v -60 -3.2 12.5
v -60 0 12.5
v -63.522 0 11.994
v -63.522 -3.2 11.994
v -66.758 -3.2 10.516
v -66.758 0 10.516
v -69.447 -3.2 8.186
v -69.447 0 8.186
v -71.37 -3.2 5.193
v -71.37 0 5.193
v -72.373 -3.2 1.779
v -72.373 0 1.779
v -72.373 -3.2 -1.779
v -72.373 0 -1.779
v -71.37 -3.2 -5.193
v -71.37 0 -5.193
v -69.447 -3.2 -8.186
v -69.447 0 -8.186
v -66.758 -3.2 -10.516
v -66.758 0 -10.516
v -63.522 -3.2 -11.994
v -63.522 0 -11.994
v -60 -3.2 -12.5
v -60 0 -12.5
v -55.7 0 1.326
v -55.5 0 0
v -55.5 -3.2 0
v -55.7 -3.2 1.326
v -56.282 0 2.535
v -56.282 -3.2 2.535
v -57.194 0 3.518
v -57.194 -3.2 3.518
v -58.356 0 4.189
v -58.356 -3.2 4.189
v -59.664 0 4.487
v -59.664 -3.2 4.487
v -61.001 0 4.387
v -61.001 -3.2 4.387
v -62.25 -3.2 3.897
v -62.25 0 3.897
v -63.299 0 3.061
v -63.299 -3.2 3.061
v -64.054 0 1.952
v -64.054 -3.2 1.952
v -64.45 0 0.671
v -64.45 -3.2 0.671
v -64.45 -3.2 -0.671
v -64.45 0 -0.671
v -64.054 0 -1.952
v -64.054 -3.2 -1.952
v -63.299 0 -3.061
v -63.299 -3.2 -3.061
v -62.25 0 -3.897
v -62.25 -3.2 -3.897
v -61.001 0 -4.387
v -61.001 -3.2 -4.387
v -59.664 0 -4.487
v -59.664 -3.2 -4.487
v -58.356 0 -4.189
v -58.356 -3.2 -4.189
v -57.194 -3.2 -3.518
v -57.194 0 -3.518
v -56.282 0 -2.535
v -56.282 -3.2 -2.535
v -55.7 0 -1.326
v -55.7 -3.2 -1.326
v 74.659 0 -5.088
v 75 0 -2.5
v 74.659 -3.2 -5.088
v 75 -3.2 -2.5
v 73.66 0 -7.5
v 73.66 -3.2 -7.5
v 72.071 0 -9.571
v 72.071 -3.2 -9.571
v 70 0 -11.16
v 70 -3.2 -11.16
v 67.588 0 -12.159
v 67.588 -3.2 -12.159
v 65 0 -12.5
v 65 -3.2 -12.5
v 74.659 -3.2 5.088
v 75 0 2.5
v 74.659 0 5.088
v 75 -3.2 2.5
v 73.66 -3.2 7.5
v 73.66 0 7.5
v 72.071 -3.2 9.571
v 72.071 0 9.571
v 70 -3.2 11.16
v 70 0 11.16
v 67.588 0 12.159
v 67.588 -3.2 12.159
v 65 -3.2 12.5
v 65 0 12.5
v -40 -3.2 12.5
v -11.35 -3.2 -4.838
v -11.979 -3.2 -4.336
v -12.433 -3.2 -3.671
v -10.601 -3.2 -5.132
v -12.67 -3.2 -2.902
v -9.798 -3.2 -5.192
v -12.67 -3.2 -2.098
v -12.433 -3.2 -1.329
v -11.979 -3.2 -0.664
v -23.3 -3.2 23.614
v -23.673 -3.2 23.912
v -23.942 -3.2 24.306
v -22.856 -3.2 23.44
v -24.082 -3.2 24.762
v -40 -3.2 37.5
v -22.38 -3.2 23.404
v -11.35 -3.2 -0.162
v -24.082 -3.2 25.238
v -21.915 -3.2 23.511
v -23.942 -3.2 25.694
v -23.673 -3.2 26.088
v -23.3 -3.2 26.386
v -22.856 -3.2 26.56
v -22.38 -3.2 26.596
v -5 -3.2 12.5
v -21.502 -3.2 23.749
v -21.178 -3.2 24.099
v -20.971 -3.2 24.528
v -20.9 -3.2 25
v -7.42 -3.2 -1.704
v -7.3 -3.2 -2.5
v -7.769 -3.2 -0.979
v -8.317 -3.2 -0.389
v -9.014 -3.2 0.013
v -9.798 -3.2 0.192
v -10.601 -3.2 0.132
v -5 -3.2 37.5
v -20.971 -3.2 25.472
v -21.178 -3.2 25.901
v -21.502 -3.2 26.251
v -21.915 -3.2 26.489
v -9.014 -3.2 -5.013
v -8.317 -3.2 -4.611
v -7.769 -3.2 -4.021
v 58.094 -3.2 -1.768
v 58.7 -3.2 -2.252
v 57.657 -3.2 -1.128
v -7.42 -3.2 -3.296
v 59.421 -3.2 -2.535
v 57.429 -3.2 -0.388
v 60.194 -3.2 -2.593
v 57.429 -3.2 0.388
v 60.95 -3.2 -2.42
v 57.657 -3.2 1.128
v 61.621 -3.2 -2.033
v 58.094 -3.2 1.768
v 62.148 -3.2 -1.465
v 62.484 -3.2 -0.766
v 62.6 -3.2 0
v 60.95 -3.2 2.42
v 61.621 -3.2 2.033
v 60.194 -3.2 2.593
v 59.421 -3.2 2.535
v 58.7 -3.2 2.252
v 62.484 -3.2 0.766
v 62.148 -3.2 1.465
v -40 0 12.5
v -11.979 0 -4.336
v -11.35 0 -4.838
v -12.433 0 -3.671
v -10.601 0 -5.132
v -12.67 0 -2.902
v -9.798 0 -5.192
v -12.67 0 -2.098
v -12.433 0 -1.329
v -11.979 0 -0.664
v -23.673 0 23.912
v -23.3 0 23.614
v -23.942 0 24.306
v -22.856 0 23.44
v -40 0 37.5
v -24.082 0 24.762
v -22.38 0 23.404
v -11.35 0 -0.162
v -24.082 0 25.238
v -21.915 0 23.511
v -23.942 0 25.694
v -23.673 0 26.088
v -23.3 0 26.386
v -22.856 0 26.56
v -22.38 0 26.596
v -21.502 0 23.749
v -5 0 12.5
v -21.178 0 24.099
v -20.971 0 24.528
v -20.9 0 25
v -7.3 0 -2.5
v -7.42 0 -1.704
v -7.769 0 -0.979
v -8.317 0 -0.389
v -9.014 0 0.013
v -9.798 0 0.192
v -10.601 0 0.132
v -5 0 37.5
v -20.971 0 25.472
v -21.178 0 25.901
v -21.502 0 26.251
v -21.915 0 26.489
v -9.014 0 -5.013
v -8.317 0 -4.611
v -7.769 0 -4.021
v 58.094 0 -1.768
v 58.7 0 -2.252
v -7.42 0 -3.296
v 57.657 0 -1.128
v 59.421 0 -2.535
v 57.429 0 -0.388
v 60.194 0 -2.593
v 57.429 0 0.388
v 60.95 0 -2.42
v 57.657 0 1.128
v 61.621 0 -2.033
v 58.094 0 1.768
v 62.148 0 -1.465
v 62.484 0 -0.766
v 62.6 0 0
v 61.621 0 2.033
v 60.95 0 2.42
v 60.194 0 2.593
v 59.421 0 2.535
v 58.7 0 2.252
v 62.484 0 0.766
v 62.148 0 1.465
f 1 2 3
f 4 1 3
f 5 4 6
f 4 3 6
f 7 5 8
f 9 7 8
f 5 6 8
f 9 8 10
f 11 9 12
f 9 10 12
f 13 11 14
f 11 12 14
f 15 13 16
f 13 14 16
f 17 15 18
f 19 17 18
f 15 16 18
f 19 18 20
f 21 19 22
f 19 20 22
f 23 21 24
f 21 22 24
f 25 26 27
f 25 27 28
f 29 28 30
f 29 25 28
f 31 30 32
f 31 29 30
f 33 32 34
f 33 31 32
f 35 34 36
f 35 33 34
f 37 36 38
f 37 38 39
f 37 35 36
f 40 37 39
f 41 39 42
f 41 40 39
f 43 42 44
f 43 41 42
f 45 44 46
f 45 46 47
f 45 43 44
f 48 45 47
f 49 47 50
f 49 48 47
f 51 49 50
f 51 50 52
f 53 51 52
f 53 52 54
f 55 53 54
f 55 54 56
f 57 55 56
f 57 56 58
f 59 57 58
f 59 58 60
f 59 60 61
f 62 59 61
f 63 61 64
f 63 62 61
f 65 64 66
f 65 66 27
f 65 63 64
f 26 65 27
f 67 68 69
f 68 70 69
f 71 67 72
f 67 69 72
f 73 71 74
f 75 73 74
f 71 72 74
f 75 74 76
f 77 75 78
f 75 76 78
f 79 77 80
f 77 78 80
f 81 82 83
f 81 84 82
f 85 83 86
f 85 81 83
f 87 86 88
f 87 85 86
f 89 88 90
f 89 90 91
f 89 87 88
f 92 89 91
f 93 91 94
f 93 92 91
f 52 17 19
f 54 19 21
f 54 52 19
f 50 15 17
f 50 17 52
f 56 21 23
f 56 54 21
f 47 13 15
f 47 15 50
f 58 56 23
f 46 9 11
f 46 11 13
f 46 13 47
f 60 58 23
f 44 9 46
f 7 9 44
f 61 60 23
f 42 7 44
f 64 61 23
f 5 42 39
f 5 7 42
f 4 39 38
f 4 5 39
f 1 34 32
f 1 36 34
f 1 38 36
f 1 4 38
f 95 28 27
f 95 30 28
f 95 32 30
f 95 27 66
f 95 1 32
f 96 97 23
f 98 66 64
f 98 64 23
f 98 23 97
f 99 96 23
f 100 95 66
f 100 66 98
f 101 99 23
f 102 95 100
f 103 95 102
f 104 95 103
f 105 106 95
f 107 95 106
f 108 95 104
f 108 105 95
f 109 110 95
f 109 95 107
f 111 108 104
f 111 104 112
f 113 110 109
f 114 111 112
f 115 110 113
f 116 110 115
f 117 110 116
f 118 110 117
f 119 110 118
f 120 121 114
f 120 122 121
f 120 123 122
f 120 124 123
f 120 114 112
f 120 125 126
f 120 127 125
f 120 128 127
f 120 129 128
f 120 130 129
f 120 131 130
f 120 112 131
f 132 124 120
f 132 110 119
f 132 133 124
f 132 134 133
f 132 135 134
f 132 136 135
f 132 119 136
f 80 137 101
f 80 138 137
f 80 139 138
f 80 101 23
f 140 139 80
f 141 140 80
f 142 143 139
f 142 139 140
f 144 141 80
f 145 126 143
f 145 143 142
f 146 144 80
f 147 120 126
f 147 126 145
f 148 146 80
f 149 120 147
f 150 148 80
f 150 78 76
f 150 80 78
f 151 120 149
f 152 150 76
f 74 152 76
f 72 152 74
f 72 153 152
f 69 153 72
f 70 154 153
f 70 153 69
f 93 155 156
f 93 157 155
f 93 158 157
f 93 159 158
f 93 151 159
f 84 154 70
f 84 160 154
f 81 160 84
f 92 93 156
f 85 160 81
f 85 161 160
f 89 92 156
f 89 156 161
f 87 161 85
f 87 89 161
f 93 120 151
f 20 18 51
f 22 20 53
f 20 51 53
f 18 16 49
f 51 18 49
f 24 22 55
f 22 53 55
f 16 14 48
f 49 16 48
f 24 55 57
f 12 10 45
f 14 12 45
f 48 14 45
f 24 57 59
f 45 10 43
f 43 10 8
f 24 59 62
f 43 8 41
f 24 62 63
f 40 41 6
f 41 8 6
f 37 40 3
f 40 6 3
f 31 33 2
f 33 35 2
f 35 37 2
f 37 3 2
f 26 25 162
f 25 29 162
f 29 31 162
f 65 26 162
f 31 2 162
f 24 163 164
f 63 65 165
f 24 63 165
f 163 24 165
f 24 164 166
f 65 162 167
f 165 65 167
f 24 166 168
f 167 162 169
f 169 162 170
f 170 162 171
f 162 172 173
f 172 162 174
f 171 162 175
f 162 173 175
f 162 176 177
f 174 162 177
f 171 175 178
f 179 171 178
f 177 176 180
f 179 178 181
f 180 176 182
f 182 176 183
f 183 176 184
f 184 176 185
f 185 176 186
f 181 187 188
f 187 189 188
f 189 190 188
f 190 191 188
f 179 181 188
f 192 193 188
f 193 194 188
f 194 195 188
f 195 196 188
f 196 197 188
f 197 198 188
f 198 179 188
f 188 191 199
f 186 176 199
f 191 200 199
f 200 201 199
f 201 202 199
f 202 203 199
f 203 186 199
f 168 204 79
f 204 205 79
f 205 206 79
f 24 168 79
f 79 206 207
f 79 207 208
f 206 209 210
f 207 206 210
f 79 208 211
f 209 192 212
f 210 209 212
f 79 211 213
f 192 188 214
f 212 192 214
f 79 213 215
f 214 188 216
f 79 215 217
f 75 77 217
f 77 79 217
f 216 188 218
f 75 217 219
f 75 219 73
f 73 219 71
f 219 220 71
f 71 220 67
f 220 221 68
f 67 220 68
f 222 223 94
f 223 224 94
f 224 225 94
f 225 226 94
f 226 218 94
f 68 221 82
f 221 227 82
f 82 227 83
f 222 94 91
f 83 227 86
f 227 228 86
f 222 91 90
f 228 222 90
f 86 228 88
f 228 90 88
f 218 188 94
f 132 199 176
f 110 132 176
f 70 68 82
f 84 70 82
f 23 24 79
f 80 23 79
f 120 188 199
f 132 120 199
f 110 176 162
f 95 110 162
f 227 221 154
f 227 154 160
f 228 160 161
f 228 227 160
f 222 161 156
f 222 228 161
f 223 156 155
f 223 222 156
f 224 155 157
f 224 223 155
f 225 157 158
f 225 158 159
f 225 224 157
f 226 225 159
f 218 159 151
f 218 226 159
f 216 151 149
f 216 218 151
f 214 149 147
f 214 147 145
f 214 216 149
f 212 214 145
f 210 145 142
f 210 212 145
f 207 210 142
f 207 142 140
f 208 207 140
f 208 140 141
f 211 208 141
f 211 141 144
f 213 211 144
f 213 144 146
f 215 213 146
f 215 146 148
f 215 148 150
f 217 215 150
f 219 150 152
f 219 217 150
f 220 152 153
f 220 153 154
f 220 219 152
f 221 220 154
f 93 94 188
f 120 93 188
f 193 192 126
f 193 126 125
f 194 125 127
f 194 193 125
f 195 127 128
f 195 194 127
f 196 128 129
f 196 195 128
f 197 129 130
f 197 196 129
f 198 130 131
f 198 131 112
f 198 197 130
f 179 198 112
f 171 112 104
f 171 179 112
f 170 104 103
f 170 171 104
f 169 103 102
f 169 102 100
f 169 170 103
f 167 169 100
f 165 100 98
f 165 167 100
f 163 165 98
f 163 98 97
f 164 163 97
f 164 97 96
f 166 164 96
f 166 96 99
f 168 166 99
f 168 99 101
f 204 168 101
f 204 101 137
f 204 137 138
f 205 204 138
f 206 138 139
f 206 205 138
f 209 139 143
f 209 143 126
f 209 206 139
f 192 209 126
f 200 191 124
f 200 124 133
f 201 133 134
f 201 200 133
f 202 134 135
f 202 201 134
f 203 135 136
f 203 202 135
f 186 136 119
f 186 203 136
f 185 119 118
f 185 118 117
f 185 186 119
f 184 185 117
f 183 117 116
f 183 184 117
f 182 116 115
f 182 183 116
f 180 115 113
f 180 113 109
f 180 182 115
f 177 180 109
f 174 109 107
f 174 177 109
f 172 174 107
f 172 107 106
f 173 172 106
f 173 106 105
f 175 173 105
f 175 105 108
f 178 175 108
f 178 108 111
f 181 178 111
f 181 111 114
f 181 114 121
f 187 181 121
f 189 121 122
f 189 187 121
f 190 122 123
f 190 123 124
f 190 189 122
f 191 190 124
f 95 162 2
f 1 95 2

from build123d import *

# Parameters (mm, degrees)
F0_R     = 2.7
F0_R_2   = 4.5
F0_R_3   = 2.6
F0_R_4   = 1.6
F1_DEPTH = 3.2
F2_R     = 10


with BuildPart() as f1:
    # F0 (on Front) → F1 (new body)
    with BuildSketch(Plane.XZ):
        with BuildLine():
            Line((75, -12.5), (75, 12.5))
            Line((75, 12.5), (-5, 12.5))
            Line((-5, 12.5), (-5, 37.5))
            Line((-5, 37.5), (-40, 37.5))
            Line((-40, 37.5), (-40, 12.5))
            Line((-40, 12.5), (-60, 12.5))
            ThreePointArc((-60, 12.5), (-72.5, 0), (-60, -12.5))
            Line((-60, -12.5), (75, -12.5))
        make_face()
        with Locations((-10, -2.5)):
            Circle(F0_R, mode=Mode.SUBTRACT)
        with Locations((-60, 0)):
            Circle(F0_R_2, mode=Mode.SUBTRACT)
        with Locations((60, 0)):
            Circle(F0_R_3, mode=Mode.SUBTRACT)
        with Locations((-22.5, 25)):
            Circle(F0_R_4, mode=Mode.SUBTRACT)
    extrude(amount=F1_DEPTH)

    # F2
    f2_edges = [f1.edges().sort_by_distance(p)[0] for p in [
        (75, -1.6, 12.5),
        (75, -1.6, -12.5),
    ]]
    fillet(f2_edges, radius=F2_R)


solid = f1.part
